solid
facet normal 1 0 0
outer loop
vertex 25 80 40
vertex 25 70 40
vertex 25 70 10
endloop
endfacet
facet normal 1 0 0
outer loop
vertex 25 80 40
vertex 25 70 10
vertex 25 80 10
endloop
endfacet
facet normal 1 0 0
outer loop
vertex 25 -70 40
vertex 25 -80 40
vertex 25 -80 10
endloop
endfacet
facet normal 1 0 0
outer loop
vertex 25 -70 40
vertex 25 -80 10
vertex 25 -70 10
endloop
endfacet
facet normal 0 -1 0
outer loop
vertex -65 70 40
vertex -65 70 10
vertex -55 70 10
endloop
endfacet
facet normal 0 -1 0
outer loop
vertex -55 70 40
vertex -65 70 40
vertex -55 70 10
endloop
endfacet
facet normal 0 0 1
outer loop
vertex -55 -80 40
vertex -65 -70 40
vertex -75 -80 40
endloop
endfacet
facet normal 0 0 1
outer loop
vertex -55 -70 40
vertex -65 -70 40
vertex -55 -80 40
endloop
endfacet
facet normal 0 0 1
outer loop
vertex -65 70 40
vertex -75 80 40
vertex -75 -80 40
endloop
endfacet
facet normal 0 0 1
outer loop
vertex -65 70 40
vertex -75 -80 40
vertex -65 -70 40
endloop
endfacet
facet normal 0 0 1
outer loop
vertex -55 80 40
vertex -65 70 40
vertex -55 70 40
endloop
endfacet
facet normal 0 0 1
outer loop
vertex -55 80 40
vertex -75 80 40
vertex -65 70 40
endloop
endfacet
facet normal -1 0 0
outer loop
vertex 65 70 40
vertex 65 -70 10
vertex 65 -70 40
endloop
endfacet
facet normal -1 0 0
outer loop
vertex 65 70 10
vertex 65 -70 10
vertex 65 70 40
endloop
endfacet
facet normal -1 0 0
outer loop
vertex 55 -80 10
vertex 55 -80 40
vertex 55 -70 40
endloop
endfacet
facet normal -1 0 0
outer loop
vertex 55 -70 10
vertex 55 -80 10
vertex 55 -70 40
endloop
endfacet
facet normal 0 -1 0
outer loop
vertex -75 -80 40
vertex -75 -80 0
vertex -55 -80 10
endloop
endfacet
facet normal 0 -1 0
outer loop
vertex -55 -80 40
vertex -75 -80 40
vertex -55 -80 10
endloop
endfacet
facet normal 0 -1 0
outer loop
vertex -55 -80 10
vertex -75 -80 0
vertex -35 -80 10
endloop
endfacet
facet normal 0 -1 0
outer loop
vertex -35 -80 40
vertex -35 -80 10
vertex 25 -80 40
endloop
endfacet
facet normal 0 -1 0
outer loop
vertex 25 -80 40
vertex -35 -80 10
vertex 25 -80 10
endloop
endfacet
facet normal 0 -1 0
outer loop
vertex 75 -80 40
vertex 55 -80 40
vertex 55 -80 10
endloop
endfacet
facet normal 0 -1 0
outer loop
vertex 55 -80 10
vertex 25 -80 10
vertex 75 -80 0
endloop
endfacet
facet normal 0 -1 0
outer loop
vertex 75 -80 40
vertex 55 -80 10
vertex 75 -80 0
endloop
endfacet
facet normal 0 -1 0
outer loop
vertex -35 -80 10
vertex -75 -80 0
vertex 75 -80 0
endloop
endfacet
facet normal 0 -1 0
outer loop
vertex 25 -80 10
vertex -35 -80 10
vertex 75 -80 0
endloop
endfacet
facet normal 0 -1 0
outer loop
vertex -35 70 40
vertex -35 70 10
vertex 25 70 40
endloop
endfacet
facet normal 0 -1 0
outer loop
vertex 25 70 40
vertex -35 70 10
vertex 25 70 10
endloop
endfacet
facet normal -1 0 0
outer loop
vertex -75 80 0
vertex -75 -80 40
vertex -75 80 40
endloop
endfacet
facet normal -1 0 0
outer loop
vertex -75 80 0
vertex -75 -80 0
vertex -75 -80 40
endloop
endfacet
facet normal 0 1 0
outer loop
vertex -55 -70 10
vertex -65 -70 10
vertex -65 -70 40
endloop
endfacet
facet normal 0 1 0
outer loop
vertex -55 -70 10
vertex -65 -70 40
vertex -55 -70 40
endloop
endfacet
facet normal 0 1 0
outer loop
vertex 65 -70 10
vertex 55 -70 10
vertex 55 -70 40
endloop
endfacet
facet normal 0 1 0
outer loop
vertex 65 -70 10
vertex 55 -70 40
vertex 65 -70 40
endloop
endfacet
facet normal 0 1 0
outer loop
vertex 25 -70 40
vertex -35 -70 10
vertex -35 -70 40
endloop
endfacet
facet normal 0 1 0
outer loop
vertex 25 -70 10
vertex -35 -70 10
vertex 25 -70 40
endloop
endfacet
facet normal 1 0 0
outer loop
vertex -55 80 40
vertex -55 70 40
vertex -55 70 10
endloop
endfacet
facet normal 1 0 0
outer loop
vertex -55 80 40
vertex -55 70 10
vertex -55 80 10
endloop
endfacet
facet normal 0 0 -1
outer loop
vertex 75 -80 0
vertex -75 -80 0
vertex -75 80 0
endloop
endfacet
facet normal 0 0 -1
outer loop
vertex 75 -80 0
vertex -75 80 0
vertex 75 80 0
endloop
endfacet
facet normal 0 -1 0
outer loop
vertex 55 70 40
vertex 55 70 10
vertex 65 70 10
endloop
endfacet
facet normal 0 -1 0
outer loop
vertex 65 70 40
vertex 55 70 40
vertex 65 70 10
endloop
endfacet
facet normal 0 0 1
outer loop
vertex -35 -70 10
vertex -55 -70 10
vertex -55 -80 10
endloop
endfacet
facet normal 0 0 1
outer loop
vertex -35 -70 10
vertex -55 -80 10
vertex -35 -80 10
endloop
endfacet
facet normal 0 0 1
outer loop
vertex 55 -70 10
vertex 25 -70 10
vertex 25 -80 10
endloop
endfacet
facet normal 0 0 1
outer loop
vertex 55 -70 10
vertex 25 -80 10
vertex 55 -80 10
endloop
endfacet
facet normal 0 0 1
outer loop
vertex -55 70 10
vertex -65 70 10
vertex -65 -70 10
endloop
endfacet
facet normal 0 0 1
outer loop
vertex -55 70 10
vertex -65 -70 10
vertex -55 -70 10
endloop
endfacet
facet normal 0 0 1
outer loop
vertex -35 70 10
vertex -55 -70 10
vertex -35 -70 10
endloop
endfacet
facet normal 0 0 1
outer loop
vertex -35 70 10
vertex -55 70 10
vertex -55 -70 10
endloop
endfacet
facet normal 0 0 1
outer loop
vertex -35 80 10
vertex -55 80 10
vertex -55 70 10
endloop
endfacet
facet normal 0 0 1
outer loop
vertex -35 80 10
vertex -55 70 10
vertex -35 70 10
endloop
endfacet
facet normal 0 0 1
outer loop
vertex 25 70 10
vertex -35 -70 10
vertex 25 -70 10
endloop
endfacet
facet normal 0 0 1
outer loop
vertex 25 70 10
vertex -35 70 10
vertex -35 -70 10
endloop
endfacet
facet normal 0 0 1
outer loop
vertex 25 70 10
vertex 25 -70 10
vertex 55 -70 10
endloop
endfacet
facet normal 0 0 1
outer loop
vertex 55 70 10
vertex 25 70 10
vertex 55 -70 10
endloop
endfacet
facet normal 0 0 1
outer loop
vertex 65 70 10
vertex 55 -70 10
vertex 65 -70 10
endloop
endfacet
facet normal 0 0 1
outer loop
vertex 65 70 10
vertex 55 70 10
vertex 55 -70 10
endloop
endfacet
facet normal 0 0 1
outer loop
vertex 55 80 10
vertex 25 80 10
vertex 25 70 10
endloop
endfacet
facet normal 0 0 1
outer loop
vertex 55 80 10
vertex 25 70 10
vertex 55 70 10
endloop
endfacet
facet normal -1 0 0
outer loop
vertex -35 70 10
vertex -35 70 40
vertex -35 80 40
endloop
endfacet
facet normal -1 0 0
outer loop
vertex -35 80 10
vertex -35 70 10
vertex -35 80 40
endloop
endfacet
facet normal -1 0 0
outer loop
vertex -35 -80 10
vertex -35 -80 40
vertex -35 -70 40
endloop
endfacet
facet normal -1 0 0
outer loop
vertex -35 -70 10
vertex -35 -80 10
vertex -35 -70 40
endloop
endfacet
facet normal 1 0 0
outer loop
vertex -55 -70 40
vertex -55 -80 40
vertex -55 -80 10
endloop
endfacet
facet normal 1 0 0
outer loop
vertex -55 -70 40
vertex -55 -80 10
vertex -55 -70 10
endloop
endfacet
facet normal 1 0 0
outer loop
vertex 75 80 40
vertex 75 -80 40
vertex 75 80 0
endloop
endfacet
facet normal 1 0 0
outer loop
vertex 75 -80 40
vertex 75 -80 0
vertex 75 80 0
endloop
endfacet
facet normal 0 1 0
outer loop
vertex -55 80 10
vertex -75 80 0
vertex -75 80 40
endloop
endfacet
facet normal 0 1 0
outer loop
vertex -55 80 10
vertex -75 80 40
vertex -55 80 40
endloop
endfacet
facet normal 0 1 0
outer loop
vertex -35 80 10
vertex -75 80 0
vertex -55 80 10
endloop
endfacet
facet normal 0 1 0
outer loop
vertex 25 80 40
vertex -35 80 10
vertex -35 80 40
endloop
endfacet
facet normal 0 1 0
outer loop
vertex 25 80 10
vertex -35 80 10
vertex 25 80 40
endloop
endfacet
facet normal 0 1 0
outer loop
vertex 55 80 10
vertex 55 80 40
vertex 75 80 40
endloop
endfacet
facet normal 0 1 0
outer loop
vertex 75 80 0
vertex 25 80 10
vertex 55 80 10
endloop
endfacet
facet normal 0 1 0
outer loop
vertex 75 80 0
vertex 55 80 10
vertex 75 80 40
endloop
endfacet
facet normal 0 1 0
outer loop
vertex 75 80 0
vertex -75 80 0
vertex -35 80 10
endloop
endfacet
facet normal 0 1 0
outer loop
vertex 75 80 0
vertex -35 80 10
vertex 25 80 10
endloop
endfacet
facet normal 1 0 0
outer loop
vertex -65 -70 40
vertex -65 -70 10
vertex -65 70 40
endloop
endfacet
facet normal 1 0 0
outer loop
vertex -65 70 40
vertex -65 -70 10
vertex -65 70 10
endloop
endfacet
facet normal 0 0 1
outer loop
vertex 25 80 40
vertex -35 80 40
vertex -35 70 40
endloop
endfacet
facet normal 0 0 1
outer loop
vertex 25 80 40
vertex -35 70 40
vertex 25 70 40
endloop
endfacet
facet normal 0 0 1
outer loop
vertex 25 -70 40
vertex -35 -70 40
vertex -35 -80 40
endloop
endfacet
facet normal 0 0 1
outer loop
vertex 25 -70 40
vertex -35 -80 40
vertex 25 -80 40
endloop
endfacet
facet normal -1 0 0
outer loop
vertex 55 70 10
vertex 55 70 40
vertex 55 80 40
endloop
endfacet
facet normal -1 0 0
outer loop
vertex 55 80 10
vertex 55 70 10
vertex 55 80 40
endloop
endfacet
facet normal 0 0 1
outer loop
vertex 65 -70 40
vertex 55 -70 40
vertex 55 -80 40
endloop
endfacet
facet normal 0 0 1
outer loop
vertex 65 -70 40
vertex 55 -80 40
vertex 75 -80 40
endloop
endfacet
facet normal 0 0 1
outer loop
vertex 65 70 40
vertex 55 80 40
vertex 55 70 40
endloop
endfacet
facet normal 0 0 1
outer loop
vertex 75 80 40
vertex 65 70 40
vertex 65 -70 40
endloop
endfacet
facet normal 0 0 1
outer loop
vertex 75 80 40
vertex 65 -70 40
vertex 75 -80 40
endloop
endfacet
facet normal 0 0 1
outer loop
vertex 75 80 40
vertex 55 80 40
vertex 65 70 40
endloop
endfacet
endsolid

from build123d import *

# Parameters (mm, degrees)
F0_W      = 150
F0_H      = 160
F1_DEPTH  = 10
F2_W      = 150
F2_H      = 160
F2_W_2    = 130
F2_H_2    = 140
F3_DEPTH  = 30
F4_W      = 20
F4_H      = 10
F5_DEPTH  = 30
F6_W      = 30
F6_H      = 10
F7_DEPTH  = 30
F8_W      = 20
F8_H      = 10
F9_DEPTH  = 30
F10_W     = 30
F10_H     = 10
F11_DEPTH = 30


with BuildPart() as f1:
    # F0 (on Top) → F1 (new body)
    with BuildSketch(Plane.XY):
        Rectangle(F0_W, F0_H)
    extrude(amount=F1_DEPTH)

    # F2 (on face) → F3 (join)
    with BuildSketch(Plane.XY.offset(10)):
        Rectangle(F2_W, F2_H)
        Rectangle(F2_W_2, F2_H_2, mode=Mode.SUBTRACT)
    extrude(amount=F3_DEPTH)

    # F4 (on face) → F5 (cut)
    with BuildSketch(Plane.XY.offset(40)):
        with Locations((-45, 75)):
            Rectangle(F4_W, F4_H)
    extrude(amount=-F5_DEPTH, mode=Mode.SUBTRACT)

    # F6 (on face) → F7 (cut)
    with BuildSketch(Plane.XY.offset(40)):
        with Locations((40, 75)):
            Rectangle(F6_W, F6_H)
    extrude(amount=-F7_DEPTH, mode=Mode.SUBTRACT)

    # F8 (on face) → F9 (cut)
    with BuildSketch(Plane.XY.offset(40)):
        with Locations((-45, -75)):
            Rectangle(F8_W, F8_H)
    extrude(amount=-F9_DEPTH, mode=Mode.SUBTRACT)

    # F10 (on face) → F11 (cut)
    with BuildSketch(Plane.XY.offset(40)):
        with Locations((40, -75)):
            Rectangle(F10_W, F10_H)
    extrude(amount=-F11_DEPTH, mode=Mode.SUBTRACT)


solid = f1.part
